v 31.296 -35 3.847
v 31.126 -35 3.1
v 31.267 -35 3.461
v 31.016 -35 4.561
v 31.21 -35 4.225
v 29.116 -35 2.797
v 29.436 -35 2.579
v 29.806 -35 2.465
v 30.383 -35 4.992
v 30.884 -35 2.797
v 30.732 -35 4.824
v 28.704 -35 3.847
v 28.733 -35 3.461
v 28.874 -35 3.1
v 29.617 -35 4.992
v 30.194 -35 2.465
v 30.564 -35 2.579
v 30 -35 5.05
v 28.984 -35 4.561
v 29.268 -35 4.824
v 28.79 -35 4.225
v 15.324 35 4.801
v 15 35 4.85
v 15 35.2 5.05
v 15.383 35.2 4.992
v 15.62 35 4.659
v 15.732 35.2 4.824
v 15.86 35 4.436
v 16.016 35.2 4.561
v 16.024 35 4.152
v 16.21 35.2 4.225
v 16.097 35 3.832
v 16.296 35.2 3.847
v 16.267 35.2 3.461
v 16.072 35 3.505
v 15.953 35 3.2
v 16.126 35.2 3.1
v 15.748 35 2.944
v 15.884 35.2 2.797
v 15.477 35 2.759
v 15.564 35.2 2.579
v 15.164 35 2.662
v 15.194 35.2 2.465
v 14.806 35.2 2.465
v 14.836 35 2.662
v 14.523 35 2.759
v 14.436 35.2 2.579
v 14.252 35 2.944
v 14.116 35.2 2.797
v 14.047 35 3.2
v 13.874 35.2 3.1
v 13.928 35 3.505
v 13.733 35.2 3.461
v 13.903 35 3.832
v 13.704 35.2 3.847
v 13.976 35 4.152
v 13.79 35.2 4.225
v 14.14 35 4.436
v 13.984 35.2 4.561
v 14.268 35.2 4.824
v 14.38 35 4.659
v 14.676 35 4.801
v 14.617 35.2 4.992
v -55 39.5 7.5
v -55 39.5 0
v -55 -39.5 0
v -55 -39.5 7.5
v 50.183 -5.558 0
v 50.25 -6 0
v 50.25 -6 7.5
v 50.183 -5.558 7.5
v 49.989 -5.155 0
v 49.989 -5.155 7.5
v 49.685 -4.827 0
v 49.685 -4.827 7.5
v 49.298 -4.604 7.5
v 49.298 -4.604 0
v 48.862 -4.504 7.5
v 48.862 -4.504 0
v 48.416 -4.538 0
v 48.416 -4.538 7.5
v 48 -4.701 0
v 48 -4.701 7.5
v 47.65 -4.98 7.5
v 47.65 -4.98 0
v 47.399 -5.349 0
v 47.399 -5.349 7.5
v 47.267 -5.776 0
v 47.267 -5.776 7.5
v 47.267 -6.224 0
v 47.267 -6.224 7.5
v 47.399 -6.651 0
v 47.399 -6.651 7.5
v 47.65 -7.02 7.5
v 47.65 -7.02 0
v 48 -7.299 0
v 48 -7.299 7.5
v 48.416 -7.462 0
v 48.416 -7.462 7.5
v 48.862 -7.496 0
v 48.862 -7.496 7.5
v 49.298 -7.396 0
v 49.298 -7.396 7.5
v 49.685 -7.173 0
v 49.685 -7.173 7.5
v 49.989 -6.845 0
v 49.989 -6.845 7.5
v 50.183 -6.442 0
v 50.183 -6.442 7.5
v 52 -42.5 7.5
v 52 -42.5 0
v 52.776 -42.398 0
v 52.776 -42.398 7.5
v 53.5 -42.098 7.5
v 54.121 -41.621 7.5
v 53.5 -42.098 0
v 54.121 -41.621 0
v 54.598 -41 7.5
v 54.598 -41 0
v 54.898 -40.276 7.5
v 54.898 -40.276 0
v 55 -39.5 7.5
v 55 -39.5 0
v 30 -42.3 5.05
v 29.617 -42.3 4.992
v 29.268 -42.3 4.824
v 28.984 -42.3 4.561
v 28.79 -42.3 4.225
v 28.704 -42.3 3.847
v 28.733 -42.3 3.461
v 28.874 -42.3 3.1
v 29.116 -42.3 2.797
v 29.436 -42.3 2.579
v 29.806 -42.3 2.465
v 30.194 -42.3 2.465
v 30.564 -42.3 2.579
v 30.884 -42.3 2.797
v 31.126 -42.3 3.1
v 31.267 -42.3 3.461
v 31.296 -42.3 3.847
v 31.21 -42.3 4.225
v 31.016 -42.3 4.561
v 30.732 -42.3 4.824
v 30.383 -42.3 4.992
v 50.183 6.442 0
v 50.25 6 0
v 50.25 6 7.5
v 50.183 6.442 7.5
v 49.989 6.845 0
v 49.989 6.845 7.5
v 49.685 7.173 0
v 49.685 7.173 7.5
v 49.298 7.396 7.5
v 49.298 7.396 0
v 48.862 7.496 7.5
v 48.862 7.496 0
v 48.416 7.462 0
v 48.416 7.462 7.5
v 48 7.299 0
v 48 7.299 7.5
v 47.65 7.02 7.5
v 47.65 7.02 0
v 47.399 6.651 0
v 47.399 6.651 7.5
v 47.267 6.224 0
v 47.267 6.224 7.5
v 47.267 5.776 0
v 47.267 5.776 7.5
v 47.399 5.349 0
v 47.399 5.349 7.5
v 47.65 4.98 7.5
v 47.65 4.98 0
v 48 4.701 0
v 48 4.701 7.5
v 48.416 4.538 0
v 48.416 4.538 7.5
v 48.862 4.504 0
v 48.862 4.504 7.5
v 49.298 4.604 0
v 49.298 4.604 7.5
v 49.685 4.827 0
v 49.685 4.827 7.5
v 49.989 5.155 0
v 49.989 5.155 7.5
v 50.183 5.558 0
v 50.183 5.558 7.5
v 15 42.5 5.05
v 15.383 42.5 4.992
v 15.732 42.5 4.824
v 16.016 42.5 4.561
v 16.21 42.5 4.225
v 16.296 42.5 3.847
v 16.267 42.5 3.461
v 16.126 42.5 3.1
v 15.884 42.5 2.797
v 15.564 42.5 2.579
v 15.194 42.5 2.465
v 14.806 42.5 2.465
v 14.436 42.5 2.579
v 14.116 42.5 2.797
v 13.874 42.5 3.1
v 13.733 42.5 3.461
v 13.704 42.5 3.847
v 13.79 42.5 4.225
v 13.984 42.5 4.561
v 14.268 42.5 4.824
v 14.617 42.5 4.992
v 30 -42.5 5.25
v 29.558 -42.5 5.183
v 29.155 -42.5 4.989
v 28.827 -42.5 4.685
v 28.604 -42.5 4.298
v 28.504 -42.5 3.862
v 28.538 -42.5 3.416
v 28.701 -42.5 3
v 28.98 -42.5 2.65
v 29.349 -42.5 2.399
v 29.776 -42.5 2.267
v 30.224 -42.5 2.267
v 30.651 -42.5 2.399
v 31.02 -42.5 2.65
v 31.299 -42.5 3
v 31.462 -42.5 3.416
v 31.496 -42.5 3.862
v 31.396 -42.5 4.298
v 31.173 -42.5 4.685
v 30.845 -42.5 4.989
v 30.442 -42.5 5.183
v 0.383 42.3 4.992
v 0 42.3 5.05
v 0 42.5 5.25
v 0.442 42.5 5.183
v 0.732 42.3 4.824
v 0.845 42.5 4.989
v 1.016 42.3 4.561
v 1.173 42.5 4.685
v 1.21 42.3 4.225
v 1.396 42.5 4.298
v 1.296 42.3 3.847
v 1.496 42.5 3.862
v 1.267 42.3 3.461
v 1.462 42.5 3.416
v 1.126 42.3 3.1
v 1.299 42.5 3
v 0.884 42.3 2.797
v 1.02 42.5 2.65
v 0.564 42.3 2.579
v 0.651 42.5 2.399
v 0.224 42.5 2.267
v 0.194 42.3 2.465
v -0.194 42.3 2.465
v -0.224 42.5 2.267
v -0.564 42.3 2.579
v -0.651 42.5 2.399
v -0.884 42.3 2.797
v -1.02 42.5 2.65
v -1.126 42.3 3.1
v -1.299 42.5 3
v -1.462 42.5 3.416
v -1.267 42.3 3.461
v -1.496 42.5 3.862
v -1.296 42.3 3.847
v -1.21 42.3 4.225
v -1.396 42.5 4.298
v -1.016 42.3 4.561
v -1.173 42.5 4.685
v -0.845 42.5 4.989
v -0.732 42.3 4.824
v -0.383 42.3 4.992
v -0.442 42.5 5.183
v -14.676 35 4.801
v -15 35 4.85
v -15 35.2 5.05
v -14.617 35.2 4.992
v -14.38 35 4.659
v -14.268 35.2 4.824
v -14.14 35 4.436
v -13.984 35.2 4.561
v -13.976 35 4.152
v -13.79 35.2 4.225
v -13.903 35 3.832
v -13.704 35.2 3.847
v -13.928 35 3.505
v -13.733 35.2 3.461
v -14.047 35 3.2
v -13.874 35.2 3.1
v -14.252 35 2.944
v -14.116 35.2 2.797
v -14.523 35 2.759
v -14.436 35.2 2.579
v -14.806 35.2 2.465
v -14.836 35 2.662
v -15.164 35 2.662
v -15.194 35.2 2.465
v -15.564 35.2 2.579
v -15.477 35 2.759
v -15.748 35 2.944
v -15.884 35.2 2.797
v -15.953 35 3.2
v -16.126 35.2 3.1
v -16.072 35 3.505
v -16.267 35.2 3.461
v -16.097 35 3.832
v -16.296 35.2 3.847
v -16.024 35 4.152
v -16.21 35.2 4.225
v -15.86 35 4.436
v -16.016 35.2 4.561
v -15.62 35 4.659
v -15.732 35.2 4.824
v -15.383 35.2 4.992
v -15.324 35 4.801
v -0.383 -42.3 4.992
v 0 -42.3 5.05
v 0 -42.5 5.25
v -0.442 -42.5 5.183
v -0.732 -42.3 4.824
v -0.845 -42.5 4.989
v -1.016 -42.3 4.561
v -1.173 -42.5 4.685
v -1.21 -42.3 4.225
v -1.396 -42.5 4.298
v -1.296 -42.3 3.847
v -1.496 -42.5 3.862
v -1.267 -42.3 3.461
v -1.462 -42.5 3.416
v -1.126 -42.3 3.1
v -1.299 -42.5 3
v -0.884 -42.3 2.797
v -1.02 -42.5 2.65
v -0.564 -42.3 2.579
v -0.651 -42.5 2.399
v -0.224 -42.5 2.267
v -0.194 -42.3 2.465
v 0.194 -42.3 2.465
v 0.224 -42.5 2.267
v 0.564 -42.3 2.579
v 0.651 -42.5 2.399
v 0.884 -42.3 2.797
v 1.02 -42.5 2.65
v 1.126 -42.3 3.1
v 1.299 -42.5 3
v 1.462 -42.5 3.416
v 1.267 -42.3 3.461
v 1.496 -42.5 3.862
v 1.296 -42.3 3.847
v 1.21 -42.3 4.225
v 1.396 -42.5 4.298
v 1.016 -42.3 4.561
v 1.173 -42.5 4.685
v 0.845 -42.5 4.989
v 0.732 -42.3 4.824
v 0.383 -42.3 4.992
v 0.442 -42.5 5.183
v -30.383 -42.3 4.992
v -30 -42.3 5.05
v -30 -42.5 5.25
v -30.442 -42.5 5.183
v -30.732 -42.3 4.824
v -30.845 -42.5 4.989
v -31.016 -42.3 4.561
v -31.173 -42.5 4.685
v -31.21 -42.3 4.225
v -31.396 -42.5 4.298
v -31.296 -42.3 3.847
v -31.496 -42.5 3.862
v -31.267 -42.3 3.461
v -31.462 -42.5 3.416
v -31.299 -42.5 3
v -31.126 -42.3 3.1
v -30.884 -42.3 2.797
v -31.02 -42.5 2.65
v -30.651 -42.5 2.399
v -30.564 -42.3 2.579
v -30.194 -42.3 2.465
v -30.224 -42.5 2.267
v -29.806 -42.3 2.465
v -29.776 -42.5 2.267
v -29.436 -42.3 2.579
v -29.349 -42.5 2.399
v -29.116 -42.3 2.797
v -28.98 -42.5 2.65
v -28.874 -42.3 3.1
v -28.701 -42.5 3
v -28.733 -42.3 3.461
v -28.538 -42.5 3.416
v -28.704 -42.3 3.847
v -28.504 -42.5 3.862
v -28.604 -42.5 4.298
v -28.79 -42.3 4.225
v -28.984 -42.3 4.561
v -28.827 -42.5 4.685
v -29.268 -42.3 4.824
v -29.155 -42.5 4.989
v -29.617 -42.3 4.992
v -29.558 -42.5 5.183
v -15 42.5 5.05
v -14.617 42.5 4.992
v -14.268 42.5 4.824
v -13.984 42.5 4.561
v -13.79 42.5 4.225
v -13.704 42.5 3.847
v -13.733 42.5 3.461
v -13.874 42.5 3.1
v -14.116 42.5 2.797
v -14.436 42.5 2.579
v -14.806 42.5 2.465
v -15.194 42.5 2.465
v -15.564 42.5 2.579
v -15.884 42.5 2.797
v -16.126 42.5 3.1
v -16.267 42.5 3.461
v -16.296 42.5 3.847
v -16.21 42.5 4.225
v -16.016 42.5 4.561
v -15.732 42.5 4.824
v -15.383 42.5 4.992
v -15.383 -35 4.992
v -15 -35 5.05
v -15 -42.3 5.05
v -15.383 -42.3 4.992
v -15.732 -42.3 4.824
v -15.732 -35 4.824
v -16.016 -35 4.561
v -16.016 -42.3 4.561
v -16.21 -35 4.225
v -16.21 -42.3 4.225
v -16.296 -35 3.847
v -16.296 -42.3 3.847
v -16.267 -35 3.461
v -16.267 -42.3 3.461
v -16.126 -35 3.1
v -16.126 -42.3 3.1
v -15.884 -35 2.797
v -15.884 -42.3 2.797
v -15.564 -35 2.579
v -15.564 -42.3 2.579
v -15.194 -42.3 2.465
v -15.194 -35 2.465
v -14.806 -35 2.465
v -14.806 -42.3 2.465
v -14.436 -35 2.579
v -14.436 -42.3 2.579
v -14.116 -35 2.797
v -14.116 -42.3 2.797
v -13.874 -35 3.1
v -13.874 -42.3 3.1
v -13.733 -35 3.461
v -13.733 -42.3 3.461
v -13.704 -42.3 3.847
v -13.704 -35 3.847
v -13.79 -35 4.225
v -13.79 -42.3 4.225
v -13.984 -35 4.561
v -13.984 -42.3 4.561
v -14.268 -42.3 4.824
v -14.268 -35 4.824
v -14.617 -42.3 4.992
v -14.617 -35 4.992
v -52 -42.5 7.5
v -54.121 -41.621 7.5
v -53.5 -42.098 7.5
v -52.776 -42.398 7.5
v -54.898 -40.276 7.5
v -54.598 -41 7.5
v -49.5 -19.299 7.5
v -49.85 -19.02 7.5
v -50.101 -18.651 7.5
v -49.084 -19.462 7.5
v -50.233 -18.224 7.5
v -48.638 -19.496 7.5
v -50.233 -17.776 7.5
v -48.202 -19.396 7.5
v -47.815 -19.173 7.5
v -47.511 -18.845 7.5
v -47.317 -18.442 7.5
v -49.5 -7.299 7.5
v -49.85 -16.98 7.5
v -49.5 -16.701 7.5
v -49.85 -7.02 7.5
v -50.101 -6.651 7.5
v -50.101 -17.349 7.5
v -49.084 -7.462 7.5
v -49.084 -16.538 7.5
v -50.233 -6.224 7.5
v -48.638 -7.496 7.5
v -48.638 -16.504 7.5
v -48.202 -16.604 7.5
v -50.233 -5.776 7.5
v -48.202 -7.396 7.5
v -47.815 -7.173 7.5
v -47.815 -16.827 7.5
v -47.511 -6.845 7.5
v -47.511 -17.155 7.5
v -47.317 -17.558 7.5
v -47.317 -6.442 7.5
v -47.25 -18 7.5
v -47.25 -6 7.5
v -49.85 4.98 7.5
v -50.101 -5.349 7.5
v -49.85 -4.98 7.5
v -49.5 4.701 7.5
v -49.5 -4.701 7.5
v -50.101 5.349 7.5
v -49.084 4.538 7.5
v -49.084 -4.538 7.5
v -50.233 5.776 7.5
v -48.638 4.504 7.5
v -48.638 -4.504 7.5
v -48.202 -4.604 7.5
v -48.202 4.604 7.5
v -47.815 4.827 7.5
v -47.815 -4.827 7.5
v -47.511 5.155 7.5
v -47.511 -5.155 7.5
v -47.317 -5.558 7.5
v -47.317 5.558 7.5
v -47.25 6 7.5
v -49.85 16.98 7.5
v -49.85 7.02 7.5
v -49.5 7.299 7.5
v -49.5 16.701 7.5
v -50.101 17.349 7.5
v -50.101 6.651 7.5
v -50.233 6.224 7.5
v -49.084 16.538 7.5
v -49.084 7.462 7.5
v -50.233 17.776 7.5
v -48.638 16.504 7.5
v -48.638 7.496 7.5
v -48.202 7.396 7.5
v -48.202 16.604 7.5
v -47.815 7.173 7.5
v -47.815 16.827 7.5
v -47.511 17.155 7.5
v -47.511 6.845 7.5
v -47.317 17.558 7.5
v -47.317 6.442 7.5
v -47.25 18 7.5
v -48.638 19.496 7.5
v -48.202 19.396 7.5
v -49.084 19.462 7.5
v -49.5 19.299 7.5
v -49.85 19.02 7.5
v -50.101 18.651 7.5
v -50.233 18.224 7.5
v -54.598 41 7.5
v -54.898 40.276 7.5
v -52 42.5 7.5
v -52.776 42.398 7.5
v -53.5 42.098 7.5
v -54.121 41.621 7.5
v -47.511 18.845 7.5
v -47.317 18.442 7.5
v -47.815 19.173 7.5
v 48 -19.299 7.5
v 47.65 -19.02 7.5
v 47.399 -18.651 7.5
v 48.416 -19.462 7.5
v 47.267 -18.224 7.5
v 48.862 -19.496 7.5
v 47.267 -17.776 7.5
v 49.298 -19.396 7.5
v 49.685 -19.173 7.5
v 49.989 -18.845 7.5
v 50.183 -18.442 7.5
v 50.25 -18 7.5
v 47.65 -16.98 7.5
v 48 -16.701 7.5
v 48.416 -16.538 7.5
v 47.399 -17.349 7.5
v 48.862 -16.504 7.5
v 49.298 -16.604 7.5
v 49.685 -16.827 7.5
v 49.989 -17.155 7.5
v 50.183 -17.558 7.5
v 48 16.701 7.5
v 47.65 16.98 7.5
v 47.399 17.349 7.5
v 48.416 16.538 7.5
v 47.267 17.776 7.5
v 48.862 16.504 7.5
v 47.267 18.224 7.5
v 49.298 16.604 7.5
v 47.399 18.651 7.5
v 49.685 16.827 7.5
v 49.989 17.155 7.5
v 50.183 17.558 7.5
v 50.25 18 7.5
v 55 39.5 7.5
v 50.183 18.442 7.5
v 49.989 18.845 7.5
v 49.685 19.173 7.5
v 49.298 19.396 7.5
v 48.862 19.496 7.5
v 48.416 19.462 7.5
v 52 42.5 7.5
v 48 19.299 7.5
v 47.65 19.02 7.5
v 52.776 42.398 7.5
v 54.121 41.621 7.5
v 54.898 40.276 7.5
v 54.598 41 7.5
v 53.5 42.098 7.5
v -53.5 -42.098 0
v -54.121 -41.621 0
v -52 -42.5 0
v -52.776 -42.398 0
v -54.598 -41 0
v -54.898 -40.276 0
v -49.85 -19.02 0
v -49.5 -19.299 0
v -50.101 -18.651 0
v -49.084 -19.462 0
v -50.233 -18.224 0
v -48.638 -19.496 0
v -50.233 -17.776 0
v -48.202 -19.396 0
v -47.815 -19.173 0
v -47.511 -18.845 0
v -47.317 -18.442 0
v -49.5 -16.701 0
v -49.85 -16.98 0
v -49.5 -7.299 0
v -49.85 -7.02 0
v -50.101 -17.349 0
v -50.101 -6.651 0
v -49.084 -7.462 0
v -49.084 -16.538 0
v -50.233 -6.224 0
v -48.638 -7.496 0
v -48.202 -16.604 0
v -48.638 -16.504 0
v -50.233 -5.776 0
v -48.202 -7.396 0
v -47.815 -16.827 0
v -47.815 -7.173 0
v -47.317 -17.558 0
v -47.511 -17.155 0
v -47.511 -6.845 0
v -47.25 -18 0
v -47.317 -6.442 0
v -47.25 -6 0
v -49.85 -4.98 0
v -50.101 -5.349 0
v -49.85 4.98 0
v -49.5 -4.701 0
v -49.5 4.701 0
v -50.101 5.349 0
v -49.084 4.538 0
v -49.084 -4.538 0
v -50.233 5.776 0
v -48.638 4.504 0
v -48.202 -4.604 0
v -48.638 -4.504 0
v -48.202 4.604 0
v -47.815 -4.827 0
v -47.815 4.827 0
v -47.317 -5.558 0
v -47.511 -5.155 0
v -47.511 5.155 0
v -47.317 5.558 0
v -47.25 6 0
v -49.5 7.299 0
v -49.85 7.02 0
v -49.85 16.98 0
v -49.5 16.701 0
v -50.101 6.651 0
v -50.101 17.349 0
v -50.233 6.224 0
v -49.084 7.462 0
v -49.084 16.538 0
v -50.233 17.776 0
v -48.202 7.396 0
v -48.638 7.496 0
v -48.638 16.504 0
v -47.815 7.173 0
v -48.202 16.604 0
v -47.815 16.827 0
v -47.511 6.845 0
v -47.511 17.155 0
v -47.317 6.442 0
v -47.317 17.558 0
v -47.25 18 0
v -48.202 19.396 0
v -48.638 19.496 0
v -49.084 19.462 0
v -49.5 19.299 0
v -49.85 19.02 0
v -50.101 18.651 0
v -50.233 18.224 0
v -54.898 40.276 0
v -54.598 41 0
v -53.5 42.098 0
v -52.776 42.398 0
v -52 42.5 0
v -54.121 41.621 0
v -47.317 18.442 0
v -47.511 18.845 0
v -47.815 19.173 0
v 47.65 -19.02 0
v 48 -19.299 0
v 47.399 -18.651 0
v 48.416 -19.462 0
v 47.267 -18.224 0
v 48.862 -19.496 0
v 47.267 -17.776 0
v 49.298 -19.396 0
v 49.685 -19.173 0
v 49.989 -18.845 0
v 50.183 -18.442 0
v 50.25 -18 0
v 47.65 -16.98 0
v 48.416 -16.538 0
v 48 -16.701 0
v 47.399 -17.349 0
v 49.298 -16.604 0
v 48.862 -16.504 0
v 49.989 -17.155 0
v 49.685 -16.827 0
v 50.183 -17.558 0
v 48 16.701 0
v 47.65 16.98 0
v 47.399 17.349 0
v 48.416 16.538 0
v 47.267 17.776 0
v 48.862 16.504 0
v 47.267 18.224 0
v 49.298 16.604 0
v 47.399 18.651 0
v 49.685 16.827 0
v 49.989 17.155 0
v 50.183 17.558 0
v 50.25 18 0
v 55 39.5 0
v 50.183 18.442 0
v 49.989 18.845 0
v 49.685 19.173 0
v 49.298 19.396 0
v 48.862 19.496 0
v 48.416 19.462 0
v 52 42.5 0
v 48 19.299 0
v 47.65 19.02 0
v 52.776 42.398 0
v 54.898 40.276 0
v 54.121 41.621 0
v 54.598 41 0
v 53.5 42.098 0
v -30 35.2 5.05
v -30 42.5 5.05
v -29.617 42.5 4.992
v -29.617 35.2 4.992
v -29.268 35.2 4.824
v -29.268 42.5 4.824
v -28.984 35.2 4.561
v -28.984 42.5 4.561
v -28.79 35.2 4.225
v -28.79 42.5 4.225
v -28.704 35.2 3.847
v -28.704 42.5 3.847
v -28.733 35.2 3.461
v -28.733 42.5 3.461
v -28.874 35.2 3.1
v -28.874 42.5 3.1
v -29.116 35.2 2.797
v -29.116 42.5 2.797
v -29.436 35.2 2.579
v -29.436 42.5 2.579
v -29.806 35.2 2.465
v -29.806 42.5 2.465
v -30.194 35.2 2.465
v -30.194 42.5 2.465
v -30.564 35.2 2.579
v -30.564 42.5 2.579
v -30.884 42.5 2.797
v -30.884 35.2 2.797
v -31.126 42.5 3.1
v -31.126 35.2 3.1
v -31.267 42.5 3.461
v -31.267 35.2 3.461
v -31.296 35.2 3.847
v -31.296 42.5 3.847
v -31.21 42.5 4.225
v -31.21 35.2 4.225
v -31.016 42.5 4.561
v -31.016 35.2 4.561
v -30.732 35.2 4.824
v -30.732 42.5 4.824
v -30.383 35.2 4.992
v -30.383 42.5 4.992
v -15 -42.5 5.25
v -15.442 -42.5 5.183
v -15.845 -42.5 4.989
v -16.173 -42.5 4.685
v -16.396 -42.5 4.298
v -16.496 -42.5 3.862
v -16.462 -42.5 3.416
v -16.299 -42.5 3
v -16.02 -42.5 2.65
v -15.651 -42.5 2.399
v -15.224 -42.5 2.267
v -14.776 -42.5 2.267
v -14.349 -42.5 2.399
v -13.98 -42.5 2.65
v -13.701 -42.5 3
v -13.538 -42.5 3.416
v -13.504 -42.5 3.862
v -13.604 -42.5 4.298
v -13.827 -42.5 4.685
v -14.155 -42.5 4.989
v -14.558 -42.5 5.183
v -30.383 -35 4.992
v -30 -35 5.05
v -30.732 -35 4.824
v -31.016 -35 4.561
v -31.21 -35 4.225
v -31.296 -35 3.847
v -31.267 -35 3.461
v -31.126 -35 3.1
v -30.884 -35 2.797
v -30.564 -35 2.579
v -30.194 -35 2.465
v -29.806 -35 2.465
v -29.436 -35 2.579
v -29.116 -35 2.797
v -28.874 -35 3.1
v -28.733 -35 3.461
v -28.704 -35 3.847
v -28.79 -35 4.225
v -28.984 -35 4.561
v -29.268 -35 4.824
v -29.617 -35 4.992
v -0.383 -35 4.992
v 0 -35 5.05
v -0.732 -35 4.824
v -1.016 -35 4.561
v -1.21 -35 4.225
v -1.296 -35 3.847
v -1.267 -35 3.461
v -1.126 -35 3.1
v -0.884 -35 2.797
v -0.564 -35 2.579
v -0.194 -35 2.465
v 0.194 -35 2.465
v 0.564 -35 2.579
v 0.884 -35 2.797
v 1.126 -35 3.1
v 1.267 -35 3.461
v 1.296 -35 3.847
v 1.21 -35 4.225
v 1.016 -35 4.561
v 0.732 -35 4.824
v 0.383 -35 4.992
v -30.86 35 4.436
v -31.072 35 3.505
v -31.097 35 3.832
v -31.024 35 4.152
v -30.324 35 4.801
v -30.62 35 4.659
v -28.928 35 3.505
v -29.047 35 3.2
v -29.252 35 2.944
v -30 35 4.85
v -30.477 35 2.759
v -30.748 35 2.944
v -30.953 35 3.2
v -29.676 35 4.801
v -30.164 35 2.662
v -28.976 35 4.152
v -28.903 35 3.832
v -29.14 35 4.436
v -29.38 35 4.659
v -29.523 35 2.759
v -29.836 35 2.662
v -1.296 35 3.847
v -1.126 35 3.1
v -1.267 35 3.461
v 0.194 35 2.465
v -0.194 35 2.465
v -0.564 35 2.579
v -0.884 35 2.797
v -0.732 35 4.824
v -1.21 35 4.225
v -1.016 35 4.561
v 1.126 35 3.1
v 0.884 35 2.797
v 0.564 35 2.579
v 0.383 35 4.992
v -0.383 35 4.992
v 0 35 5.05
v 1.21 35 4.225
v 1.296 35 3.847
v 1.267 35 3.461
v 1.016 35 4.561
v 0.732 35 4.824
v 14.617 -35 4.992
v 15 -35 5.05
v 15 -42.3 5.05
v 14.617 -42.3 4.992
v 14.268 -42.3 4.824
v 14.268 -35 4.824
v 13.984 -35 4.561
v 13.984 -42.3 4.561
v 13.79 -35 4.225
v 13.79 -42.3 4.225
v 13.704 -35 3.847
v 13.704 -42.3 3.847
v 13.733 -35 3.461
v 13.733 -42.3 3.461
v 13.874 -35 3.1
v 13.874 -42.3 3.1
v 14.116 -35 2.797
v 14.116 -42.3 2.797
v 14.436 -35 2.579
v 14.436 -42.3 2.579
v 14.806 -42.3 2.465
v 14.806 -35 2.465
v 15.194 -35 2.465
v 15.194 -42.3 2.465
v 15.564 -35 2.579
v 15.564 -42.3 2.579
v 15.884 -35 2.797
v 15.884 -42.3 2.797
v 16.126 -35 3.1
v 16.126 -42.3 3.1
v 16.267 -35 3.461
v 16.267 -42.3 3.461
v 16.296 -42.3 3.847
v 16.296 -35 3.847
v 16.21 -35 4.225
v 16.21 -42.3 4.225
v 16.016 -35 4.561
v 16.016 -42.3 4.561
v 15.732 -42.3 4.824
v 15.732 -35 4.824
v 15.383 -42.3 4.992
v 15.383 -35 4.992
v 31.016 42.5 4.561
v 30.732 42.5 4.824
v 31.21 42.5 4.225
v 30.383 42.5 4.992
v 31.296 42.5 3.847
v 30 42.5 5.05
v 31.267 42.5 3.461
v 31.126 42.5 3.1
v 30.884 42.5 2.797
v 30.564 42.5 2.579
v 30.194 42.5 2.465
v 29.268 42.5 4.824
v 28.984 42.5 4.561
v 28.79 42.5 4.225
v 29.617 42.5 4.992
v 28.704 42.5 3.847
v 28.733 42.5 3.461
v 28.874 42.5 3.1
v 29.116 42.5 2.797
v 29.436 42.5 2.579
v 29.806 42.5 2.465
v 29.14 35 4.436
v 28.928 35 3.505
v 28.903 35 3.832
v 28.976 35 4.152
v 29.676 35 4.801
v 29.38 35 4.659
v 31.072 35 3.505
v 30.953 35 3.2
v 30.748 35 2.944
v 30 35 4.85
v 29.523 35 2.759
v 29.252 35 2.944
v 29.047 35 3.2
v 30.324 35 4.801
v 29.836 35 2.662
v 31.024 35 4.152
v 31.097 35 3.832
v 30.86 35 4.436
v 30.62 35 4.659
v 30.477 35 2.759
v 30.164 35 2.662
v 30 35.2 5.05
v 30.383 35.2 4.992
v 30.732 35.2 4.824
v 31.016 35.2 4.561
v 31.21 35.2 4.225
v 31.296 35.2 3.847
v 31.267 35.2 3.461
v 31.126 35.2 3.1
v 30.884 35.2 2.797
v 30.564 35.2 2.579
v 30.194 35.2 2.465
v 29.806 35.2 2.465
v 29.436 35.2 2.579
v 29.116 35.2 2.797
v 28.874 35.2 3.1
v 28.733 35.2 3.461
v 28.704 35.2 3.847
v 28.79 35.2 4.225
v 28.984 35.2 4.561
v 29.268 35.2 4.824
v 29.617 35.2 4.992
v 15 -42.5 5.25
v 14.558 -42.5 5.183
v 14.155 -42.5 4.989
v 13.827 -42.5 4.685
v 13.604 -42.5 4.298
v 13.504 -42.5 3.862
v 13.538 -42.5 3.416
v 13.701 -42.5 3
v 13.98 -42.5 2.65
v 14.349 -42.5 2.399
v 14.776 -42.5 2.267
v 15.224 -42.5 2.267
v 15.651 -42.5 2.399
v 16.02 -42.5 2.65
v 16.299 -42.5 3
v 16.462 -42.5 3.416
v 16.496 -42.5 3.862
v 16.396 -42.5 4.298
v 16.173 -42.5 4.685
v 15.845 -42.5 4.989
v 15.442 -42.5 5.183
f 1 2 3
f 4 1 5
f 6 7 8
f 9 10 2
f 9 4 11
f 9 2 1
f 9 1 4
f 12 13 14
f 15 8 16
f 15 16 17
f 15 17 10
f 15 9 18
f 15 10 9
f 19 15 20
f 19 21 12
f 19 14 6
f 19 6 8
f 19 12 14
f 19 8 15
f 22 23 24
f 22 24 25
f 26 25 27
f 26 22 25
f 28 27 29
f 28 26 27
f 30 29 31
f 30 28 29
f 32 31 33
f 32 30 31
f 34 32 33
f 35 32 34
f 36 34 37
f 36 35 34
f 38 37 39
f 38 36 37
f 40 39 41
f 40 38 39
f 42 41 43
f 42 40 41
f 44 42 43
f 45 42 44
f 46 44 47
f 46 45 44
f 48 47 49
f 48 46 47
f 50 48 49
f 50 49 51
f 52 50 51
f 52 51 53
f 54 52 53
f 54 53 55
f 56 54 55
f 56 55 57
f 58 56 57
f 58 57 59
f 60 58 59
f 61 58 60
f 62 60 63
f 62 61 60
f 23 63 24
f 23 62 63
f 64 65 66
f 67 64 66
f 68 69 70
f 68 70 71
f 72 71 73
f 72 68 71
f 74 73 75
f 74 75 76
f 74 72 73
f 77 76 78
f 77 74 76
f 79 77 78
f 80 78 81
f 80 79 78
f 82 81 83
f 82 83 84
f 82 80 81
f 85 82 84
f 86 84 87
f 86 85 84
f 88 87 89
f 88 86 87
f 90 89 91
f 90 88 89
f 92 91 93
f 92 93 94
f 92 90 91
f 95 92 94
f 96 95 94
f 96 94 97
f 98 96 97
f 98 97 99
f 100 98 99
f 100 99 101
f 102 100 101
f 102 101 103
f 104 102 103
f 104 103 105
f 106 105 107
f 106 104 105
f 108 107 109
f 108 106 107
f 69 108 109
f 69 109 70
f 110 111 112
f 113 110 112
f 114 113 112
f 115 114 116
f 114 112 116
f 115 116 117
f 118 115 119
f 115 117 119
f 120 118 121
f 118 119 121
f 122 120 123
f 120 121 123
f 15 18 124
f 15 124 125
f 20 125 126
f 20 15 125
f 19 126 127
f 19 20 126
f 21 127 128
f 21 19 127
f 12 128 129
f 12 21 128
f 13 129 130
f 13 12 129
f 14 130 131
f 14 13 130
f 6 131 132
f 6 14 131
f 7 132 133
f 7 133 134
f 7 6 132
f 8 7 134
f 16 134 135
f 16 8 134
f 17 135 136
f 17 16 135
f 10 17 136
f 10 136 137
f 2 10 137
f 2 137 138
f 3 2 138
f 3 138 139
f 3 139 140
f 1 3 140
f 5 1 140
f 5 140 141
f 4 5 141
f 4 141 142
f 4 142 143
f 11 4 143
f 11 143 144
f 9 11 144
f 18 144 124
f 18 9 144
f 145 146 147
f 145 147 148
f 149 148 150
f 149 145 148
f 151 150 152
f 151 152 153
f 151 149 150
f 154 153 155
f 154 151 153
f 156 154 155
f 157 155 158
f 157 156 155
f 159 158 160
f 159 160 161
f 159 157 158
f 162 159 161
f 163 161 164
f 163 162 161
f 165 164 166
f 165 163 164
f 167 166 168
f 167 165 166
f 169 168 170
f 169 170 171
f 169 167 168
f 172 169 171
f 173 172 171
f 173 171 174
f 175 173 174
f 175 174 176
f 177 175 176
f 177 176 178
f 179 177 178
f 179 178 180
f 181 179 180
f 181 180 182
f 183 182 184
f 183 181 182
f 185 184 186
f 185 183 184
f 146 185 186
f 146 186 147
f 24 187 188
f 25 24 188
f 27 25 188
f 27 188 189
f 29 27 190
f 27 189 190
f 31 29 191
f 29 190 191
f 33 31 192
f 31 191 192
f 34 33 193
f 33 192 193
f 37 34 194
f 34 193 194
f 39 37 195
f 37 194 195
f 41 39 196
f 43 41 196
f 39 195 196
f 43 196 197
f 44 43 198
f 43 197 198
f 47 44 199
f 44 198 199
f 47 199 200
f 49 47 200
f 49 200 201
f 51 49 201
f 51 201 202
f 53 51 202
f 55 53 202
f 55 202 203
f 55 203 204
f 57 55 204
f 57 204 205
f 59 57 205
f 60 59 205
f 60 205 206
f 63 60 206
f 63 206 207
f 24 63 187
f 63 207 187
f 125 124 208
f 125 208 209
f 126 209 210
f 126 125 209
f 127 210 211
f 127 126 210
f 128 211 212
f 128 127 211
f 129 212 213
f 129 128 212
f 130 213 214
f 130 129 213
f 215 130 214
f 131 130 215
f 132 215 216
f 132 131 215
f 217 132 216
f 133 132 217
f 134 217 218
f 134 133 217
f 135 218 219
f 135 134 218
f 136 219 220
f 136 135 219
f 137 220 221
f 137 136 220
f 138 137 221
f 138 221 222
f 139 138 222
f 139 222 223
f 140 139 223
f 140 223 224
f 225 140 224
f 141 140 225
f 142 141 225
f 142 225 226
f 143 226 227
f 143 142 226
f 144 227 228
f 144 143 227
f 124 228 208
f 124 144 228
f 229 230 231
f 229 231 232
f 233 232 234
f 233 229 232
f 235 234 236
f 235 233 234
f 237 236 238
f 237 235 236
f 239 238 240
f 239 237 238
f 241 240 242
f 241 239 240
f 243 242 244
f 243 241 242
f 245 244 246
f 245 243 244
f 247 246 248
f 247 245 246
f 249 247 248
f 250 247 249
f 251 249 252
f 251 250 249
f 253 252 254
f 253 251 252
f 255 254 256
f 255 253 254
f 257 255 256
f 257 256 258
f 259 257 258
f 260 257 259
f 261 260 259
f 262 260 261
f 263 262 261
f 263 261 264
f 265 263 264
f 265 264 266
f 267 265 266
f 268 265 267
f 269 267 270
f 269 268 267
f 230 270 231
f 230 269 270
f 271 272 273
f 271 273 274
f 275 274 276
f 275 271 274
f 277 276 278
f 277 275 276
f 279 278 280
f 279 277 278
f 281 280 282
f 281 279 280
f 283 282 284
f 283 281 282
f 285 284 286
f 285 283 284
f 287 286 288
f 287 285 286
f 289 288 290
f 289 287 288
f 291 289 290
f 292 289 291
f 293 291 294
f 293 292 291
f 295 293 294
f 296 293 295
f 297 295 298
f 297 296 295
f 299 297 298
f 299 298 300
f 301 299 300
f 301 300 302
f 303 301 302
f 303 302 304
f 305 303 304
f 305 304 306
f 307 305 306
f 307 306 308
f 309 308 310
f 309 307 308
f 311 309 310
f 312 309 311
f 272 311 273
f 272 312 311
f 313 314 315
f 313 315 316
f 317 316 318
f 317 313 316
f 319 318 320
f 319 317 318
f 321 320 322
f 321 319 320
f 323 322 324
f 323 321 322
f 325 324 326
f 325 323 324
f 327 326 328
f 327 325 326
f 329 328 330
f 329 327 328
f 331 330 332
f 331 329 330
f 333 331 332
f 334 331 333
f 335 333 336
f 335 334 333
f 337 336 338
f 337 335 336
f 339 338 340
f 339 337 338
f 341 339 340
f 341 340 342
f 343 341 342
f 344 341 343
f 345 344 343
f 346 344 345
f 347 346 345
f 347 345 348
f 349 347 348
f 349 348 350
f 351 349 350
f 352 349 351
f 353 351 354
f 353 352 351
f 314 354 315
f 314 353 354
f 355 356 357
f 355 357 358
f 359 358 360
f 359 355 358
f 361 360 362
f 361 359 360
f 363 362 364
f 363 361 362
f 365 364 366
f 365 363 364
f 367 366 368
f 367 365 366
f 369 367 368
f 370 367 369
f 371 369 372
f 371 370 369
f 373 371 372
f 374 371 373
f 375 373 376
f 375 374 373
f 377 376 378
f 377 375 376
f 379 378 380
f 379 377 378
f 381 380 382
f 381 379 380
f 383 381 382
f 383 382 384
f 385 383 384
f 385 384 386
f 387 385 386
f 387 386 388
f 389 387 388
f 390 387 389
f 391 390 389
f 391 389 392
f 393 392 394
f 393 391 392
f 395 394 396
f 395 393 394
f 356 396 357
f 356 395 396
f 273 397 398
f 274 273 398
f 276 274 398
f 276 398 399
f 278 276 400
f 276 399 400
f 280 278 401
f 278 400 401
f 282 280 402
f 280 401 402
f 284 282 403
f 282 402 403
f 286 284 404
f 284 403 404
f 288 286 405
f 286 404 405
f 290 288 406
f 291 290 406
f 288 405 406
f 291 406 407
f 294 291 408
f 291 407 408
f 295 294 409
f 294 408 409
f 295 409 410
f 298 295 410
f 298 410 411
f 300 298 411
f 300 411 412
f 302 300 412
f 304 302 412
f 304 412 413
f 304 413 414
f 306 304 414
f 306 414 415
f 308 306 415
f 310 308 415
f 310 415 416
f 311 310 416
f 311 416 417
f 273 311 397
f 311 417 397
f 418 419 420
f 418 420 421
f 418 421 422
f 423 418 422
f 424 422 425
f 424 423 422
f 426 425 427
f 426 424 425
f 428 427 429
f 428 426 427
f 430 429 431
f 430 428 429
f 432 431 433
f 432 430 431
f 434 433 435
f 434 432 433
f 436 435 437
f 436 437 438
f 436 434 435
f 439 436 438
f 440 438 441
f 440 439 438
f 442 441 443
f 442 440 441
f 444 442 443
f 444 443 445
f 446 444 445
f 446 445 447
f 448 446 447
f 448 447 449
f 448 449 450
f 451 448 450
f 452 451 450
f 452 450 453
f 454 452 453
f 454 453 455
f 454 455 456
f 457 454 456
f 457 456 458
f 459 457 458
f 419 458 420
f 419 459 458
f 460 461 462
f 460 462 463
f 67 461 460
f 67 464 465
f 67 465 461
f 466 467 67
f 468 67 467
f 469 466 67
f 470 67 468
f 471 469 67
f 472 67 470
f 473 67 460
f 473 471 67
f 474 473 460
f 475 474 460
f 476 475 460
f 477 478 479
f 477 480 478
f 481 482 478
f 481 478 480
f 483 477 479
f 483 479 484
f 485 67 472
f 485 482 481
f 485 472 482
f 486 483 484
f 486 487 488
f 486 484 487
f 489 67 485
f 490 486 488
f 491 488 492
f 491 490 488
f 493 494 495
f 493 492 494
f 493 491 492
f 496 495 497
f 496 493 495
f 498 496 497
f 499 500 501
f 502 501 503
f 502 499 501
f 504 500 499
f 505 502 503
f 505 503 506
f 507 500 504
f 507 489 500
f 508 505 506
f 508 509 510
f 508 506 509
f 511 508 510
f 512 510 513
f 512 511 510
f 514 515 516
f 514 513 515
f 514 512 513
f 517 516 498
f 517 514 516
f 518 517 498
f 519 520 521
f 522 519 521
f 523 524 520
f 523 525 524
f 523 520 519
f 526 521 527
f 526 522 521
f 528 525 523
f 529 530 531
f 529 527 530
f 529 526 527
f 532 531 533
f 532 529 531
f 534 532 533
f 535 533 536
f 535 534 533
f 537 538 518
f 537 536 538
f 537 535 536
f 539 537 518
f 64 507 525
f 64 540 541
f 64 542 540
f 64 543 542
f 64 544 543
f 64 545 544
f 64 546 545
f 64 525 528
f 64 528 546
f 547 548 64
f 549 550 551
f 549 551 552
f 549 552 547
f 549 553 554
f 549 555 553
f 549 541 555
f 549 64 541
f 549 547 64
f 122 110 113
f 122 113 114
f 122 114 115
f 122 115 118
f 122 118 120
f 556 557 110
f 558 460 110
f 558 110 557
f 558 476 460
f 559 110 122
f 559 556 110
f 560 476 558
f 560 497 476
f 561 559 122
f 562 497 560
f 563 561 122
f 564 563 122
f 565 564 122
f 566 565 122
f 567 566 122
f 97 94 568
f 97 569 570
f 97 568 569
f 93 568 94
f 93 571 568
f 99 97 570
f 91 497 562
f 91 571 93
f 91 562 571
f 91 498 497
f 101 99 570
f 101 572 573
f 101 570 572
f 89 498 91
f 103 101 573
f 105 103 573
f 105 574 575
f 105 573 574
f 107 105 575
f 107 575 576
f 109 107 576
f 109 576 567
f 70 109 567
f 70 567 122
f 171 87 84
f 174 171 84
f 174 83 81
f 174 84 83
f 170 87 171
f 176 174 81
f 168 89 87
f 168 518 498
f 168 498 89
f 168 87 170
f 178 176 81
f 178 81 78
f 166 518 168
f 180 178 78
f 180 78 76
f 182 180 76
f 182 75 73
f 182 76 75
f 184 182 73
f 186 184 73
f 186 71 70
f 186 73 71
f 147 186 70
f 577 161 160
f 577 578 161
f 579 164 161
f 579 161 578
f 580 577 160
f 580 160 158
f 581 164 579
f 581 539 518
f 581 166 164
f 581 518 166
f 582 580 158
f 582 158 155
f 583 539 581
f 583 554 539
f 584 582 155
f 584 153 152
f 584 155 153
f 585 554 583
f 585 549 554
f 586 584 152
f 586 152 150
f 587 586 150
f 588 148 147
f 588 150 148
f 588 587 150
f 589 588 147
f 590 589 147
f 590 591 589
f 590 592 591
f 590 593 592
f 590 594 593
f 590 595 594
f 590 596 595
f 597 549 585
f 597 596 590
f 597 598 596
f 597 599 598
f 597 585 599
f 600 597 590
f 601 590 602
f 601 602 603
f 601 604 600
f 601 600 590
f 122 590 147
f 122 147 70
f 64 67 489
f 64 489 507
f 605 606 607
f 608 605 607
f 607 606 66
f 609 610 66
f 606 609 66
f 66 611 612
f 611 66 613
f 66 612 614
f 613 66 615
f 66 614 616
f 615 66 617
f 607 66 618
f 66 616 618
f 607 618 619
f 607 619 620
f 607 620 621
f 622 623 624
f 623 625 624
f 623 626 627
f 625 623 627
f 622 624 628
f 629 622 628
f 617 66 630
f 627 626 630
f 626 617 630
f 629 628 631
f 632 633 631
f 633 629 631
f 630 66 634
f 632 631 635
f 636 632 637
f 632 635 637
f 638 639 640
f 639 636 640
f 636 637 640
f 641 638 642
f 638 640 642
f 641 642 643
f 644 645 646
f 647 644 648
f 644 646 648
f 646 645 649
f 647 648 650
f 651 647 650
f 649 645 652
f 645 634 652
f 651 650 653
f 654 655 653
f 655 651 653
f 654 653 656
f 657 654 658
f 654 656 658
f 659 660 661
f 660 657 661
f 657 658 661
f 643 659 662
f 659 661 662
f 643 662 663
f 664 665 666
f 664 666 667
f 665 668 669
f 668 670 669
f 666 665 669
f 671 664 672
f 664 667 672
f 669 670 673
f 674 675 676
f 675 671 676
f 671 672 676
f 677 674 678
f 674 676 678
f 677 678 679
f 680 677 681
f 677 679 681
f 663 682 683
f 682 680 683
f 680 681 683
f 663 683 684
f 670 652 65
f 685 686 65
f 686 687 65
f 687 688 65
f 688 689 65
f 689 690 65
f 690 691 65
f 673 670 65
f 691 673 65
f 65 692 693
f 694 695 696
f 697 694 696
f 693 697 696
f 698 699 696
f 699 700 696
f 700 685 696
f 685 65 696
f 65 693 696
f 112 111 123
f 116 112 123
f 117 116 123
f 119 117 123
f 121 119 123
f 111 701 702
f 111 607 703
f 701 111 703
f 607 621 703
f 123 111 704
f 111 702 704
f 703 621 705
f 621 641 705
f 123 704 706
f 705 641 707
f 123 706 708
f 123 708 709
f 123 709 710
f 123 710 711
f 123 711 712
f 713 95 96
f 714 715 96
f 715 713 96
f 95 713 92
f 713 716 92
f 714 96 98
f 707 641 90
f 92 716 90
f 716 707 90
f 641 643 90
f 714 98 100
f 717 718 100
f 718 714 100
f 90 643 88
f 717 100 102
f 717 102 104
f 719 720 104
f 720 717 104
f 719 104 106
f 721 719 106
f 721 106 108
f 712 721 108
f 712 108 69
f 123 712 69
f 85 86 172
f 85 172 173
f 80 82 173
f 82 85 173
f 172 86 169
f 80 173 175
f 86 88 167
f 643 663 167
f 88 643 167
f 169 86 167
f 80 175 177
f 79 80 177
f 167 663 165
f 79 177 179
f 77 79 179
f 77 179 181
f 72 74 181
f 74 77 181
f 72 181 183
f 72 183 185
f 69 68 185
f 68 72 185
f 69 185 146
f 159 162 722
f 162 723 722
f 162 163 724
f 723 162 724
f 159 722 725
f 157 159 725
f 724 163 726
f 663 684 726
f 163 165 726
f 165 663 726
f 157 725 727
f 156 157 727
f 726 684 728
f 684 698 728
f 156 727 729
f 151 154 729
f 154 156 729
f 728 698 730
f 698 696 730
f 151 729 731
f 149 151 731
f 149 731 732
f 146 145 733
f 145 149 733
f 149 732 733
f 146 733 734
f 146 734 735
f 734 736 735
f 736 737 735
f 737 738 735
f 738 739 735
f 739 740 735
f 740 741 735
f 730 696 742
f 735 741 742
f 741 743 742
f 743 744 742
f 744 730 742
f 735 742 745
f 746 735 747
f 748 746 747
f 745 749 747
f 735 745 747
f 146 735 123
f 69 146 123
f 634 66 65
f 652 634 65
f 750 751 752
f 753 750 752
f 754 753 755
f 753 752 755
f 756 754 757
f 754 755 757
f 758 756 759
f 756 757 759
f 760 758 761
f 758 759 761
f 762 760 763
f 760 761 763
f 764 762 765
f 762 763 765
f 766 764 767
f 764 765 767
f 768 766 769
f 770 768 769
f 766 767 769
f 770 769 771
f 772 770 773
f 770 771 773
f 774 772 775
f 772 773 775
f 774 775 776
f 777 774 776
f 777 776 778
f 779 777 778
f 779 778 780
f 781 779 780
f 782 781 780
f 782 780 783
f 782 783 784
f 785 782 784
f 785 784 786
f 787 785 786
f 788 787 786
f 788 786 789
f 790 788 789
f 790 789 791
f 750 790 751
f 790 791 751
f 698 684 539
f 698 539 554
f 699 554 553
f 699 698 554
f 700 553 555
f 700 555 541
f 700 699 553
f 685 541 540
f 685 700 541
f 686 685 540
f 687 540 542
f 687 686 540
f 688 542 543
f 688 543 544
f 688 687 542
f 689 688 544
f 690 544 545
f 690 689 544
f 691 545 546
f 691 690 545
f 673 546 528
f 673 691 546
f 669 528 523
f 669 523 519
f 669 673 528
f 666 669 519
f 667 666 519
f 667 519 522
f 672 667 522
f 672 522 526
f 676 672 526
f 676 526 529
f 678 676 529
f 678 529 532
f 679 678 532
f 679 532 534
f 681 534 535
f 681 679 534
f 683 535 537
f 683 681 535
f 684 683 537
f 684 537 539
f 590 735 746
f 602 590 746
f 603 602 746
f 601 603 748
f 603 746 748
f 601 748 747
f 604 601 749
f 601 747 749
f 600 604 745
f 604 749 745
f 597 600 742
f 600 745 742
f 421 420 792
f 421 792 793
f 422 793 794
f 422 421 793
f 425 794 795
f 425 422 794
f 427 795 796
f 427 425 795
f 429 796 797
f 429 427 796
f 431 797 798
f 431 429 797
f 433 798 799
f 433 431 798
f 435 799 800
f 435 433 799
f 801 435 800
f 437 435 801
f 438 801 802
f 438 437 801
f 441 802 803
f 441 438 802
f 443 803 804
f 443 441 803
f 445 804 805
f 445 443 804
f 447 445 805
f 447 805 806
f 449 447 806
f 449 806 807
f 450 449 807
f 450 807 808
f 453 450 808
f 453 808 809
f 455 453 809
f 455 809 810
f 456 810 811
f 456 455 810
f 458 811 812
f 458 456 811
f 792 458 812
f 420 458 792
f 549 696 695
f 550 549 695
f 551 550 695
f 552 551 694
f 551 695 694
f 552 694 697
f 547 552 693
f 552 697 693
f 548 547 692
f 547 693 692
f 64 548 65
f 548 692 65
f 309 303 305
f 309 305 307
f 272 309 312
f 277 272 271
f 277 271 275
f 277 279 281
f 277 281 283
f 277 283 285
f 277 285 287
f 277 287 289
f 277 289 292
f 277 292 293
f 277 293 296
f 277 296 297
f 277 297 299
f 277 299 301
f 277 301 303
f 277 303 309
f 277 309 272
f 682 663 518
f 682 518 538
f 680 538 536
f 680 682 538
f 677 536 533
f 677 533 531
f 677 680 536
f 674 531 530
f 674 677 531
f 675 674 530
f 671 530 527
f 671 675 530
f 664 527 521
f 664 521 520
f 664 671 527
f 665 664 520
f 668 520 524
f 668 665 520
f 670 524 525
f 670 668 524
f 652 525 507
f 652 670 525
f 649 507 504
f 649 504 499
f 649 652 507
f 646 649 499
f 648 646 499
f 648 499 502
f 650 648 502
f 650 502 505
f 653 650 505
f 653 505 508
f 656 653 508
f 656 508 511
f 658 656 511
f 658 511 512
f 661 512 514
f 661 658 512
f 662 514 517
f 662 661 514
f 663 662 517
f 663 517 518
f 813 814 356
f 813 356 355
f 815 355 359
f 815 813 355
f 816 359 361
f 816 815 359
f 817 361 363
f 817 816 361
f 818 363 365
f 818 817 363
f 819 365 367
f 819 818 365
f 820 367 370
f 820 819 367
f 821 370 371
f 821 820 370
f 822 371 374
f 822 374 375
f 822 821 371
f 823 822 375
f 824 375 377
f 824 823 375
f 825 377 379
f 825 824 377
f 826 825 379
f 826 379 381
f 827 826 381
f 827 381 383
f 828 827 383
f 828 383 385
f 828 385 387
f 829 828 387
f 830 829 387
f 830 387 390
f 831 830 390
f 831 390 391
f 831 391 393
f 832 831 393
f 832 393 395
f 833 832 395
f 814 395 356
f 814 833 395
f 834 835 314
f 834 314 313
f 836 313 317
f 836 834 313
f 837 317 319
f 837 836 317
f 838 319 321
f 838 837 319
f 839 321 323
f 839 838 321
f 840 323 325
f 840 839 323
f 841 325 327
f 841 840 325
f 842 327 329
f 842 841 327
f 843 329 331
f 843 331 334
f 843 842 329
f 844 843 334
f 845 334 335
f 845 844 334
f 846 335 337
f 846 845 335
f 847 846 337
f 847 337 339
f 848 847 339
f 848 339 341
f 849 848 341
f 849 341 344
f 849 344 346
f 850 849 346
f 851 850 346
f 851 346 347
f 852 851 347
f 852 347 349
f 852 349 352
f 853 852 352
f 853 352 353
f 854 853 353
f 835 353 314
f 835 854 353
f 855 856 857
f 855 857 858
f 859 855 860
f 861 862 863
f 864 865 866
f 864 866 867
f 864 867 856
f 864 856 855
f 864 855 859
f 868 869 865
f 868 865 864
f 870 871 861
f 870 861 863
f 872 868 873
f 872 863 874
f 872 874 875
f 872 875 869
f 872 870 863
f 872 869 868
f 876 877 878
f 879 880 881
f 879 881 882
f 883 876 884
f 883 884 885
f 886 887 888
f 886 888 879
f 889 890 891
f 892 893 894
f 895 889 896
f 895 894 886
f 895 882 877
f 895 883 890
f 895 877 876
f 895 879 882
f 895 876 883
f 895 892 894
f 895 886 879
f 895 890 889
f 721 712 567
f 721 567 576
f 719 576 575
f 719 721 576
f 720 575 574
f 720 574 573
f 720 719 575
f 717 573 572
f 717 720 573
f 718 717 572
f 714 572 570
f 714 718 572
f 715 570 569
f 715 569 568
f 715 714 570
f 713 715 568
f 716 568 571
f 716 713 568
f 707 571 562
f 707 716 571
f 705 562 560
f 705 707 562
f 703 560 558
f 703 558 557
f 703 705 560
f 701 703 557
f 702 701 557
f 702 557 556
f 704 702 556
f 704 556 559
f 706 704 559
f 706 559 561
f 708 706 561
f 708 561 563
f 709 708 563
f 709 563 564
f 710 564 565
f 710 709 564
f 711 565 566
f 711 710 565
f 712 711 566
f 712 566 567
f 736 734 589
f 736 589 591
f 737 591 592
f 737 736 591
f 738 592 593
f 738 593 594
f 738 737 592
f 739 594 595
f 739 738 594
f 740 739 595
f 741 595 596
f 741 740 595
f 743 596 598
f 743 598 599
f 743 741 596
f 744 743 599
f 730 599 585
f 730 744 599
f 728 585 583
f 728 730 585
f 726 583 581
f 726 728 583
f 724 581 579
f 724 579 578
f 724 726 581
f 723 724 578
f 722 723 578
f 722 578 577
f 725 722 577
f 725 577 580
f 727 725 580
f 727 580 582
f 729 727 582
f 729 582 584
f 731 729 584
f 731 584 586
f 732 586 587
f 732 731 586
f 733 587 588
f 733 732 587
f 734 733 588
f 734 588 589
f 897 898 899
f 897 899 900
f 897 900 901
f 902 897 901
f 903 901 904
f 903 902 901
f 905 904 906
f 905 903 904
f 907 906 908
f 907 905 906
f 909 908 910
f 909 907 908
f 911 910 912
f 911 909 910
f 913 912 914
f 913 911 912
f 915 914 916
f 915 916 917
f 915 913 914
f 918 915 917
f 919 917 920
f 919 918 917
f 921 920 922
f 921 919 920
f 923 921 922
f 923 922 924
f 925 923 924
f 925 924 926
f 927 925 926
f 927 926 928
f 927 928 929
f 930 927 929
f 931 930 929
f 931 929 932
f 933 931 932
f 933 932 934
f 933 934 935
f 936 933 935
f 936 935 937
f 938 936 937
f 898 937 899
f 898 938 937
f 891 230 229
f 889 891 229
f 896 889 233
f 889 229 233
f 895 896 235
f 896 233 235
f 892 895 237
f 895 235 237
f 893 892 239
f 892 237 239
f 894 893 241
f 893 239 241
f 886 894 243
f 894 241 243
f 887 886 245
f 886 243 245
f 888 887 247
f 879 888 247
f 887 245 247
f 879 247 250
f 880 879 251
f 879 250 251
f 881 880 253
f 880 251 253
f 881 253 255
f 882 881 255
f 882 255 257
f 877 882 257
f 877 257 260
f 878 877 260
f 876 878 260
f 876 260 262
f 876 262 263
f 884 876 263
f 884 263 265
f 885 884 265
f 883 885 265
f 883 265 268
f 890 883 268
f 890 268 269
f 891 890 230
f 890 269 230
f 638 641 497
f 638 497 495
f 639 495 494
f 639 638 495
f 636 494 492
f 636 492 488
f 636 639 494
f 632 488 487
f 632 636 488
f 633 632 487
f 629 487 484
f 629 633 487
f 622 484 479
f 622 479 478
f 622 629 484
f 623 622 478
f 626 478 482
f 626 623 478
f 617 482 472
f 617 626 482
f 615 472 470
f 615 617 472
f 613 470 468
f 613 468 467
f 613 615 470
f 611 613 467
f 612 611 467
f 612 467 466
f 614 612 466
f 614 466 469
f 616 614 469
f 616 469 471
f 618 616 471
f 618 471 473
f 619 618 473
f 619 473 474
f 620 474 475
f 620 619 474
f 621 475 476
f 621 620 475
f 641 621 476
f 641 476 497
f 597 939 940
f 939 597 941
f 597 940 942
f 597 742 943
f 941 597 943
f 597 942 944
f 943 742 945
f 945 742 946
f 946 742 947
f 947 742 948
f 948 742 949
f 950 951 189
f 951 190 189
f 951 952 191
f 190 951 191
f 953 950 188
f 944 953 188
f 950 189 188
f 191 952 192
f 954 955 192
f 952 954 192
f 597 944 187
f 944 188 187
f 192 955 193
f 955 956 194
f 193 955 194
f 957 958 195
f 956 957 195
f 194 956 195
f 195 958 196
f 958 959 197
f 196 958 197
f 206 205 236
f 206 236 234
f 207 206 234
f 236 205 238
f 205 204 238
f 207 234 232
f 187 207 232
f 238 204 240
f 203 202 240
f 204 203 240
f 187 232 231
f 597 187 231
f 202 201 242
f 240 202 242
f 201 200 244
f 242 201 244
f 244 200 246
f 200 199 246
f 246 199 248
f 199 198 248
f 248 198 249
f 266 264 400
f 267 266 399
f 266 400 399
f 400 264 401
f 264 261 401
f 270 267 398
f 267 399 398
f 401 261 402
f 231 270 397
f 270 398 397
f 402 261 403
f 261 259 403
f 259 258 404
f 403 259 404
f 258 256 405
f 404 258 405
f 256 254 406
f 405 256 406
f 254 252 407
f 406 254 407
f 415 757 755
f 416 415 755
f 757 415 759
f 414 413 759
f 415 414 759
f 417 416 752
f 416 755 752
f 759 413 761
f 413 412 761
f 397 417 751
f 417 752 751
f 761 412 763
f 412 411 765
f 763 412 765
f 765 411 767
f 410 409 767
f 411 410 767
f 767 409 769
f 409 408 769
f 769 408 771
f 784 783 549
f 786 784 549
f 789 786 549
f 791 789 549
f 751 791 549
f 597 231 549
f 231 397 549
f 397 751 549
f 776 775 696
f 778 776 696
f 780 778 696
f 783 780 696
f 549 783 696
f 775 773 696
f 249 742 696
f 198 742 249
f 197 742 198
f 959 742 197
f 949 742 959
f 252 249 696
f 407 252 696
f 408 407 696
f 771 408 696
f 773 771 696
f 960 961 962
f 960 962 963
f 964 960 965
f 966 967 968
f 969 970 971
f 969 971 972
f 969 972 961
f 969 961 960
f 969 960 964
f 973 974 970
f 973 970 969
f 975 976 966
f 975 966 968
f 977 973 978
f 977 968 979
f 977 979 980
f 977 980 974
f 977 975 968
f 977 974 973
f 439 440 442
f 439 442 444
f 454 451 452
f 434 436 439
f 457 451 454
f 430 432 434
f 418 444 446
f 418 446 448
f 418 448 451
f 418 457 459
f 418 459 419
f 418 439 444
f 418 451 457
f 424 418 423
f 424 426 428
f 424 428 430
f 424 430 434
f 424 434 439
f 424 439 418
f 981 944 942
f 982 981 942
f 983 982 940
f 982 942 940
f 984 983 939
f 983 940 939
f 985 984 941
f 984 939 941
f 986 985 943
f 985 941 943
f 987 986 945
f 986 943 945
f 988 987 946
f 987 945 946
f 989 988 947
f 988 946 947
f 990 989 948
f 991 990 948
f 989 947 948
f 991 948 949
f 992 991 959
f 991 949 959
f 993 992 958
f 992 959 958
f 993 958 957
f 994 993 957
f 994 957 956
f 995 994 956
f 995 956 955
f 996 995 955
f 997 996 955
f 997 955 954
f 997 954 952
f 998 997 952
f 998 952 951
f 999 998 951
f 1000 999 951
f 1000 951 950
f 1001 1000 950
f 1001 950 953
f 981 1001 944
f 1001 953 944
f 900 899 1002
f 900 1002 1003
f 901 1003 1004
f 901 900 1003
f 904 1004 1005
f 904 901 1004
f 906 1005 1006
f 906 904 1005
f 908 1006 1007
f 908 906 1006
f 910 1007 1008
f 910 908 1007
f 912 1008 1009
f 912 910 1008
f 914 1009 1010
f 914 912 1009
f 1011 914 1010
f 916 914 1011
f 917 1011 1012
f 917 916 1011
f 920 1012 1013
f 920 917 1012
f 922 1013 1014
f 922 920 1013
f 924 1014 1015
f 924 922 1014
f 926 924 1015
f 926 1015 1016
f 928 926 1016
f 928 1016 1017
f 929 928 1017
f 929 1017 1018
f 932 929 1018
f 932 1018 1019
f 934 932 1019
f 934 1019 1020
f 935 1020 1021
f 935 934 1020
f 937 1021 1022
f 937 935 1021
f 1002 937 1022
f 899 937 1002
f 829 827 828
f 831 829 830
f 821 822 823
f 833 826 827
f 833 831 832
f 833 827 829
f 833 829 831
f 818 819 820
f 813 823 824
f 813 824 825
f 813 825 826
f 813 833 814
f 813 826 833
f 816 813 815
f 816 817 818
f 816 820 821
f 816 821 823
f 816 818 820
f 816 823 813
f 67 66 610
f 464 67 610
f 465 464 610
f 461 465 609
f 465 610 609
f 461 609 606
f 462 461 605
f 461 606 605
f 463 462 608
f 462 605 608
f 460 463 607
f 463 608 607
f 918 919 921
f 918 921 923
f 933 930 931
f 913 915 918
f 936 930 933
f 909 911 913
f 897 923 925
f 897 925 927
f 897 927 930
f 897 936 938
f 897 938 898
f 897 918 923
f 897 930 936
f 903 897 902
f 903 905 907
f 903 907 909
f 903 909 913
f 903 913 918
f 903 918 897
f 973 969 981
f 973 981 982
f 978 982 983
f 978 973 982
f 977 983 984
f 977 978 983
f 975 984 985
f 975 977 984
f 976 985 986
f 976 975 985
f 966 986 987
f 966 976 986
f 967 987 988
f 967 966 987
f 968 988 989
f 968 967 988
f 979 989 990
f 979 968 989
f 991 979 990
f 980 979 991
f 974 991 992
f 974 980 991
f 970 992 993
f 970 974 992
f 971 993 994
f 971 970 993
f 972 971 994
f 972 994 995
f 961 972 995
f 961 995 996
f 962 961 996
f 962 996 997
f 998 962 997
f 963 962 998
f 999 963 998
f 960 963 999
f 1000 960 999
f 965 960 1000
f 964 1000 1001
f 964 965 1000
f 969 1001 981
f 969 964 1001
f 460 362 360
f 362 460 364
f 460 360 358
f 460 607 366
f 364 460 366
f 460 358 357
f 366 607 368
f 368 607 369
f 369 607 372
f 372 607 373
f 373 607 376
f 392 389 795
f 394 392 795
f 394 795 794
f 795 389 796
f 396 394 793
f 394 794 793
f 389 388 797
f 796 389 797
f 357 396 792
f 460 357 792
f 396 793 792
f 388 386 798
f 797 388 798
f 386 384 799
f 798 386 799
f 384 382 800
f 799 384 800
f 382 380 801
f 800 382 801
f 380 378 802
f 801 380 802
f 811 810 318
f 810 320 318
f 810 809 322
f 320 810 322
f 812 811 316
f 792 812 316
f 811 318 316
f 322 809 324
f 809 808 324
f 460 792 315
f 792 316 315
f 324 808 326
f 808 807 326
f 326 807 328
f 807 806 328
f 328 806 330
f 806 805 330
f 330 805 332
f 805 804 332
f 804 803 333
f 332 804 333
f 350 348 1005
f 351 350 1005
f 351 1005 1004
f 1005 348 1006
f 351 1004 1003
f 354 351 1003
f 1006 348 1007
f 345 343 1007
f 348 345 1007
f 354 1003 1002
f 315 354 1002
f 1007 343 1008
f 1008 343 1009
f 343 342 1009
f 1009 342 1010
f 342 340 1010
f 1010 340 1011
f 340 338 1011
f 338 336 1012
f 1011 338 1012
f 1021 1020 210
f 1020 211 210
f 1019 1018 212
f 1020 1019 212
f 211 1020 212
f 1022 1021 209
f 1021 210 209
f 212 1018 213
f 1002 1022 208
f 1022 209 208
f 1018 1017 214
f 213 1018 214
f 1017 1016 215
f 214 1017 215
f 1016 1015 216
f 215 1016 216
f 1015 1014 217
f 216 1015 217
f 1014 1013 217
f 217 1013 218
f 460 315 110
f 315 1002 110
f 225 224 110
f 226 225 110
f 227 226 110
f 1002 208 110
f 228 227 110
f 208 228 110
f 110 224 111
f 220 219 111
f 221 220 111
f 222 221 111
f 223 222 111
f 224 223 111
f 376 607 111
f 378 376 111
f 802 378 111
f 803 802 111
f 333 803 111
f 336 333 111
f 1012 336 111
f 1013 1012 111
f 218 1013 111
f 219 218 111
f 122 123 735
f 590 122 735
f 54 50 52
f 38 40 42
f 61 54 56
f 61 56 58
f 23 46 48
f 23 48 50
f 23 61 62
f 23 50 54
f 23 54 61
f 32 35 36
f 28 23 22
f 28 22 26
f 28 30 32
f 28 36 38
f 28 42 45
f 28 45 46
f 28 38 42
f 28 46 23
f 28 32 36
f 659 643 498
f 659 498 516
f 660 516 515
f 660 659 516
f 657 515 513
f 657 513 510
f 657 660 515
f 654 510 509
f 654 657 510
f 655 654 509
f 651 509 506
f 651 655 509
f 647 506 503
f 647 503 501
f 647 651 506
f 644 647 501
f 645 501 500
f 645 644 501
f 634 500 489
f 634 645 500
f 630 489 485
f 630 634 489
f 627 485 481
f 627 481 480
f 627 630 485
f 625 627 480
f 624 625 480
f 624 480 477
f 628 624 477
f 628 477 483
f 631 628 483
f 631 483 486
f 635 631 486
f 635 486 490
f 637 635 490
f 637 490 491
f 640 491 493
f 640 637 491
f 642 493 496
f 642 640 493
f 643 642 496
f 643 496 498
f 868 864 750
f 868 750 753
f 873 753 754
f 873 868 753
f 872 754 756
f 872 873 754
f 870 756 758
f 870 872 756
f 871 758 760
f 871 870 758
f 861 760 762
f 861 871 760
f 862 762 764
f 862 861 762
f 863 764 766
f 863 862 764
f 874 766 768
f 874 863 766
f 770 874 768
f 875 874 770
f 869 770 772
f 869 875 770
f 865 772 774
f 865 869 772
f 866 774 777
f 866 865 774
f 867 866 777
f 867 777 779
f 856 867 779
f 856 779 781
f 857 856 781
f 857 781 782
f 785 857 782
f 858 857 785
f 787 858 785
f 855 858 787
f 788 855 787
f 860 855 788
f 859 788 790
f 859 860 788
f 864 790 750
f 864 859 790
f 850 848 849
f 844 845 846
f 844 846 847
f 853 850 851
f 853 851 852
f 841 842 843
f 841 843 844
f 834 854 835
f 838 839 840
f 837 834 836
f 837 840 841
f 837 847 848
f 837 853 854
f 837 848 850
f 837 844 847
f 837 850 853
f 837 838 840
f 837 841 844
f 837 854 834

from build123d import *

# Parameters (mm, degrees)
SKETCH_1_R          = 1.5
EXTRUDE_1_DEPTH     = 7.5
SKETCH_2_R          = 1.3
CUT_EXTRUDE_1_DEPTH = 7.5
CUT_EXTRUDE_START   = -7.5
SKETCH_3_R          = 1.3
CUT_EXTRUDE_2_DEPTH = 7.5
CHAMFER_1_SIZE      = 0.2
CHAMFER_2_SIZE      = 0.2


with BuildPart() as part:
    # 草圖1 → 填料-伸長1 (new body)
    with BuildSketch(Plane.XY):
        with BuildLine():
            ThreePointArc((-55, -39.5), (-54.121320344, -41.621320344), (-52, -42.5))
            Line((-52, -42.5), (52, -42.5))
            ThreePointArc((52, -42.5), (54.121320344, -41.621320344), (55, -39.5))
            Line((55, -39.5), (55, 39.5))
            ThreePointArc((55, 39.5), (54.121320344, 41.621320344), (52, 42.5))
            Line((52, 42.5), (-52, 42.5))
            ThreePointArc((-52, 42.5), (-54.121320344, 41.621320344), (-55, 39.5))
            Line((-55, 39.5), (-55, -39.5))
        make_face()
        with Locations((-48.75, -18)):
            Circle(SKETCH_1_R, mode=Mode.SUBTRACT)
        with Locations((-48.75, -6)):
            Circle(SKETCH_1_R, mode=Mode.SUBTRACT)
        with Locations((48.75, -18)):
            Circle(SKETCH_1_R, mode=Mode.SUBTRACT)
        with Locations((48.75, -6)):
            Circle(SKETCH_1_R, mode=Mode.SUBTRACT)
        with Locations((-48.75, 6)):
            Circle(SKETCH_1_R, mode=Mode.SUBTRACT)
        with Locations((-48.75, 18)):
            Circle(SKETCH_1_R, mode=Mode.SUBTRACT)
        with Locations((48.75, 6)):
            Circle(SKETCH_1_R, mode=Mode.SUBTRACT)
        with Locations((48.75, 18)):
            Circle(SKETCH_1_R, mode=Mode.SUBTRACT)
    extrude(amount=EXTRUDE_1_DEPTH)

    # 草圖2 → 除料-伸長1 (cut)
    with BuildSketch(Plane(origin=(0, 42.5, 0), x_dir=(1, 0, 0), z_dir=(0, 1, 0))):
        with Locations((-15, -3.75)):
            Circle(SKETCH_2_R)
        with Locations((30, -3.75)):
            Circle(SKETCH_2_R)
        with Locations((0, -3.75)):
            Circle(SKETCH_2_R)
        with Locations((15, -3.75)):
            Circle(SKETCH_2_R)
        with Locations((-30, -3.75)):
            Circle(SKETCH_2_R)
    extrude(amount=-CUT_EXTRUDE_1_DEPTH, mode=Mode.SUBTRACT)

    # 草圖3 → 除料-伸長2 (cut)
    with BuildSketch(Plane(origin=(0, -42.5, 0), x_dir=(-1, 0, 0), z_dir=(0, -1, 0)).offset(CUT_EXTRUDE_START)):
        with Locations((15, -3.75)):
            Circle(SKETCH_3_R)
        with Locations((-30, -3.75)):
            Circle(SKETCH_3_R)
        with Locations((-15, -3.75)):
            Circle(SKETCH_3_R)
        with Locations((0, -3.75)):
            Circle(SKETCH_3_R)
        with Locations((30, -3.75)):
            Circle(SKETCH_3_R)
    extrude(amount=CUT_EXTRUDE_2_DEPTH, mode=Mode.SUBTRACT)

    # 導角1
    chamfer_1_edges = [part.edges().sort_by_distance(p)[0] for p in [
        (-31.3, 35, 3.75),
        (28.7, 35, 3.75),
        (13.7, 35, 3.75),
        (-1.3, 42.5, 3.75),
        (-16.3, 35, 3.75),
    ]]
    chamfer(chamfer_1_edges, length=CHAMFER_1_SIZE)

    # 導角2
    chamfer_2_edges = [part.edges().sort_by_distance(p)[0] for p in [
        (31.3, -42.5, 3.75),
        (16.3, -42.5, 3.75),
        (1.3, -42.5, 3.75),
        (-13.7, -42.5, 3.75),
        (-28.7, -42.5, 3.75),
    ]]
    chamfer(chamfer_2_edges, length=CHAMFER_2_SIZE)


solid = part.part
